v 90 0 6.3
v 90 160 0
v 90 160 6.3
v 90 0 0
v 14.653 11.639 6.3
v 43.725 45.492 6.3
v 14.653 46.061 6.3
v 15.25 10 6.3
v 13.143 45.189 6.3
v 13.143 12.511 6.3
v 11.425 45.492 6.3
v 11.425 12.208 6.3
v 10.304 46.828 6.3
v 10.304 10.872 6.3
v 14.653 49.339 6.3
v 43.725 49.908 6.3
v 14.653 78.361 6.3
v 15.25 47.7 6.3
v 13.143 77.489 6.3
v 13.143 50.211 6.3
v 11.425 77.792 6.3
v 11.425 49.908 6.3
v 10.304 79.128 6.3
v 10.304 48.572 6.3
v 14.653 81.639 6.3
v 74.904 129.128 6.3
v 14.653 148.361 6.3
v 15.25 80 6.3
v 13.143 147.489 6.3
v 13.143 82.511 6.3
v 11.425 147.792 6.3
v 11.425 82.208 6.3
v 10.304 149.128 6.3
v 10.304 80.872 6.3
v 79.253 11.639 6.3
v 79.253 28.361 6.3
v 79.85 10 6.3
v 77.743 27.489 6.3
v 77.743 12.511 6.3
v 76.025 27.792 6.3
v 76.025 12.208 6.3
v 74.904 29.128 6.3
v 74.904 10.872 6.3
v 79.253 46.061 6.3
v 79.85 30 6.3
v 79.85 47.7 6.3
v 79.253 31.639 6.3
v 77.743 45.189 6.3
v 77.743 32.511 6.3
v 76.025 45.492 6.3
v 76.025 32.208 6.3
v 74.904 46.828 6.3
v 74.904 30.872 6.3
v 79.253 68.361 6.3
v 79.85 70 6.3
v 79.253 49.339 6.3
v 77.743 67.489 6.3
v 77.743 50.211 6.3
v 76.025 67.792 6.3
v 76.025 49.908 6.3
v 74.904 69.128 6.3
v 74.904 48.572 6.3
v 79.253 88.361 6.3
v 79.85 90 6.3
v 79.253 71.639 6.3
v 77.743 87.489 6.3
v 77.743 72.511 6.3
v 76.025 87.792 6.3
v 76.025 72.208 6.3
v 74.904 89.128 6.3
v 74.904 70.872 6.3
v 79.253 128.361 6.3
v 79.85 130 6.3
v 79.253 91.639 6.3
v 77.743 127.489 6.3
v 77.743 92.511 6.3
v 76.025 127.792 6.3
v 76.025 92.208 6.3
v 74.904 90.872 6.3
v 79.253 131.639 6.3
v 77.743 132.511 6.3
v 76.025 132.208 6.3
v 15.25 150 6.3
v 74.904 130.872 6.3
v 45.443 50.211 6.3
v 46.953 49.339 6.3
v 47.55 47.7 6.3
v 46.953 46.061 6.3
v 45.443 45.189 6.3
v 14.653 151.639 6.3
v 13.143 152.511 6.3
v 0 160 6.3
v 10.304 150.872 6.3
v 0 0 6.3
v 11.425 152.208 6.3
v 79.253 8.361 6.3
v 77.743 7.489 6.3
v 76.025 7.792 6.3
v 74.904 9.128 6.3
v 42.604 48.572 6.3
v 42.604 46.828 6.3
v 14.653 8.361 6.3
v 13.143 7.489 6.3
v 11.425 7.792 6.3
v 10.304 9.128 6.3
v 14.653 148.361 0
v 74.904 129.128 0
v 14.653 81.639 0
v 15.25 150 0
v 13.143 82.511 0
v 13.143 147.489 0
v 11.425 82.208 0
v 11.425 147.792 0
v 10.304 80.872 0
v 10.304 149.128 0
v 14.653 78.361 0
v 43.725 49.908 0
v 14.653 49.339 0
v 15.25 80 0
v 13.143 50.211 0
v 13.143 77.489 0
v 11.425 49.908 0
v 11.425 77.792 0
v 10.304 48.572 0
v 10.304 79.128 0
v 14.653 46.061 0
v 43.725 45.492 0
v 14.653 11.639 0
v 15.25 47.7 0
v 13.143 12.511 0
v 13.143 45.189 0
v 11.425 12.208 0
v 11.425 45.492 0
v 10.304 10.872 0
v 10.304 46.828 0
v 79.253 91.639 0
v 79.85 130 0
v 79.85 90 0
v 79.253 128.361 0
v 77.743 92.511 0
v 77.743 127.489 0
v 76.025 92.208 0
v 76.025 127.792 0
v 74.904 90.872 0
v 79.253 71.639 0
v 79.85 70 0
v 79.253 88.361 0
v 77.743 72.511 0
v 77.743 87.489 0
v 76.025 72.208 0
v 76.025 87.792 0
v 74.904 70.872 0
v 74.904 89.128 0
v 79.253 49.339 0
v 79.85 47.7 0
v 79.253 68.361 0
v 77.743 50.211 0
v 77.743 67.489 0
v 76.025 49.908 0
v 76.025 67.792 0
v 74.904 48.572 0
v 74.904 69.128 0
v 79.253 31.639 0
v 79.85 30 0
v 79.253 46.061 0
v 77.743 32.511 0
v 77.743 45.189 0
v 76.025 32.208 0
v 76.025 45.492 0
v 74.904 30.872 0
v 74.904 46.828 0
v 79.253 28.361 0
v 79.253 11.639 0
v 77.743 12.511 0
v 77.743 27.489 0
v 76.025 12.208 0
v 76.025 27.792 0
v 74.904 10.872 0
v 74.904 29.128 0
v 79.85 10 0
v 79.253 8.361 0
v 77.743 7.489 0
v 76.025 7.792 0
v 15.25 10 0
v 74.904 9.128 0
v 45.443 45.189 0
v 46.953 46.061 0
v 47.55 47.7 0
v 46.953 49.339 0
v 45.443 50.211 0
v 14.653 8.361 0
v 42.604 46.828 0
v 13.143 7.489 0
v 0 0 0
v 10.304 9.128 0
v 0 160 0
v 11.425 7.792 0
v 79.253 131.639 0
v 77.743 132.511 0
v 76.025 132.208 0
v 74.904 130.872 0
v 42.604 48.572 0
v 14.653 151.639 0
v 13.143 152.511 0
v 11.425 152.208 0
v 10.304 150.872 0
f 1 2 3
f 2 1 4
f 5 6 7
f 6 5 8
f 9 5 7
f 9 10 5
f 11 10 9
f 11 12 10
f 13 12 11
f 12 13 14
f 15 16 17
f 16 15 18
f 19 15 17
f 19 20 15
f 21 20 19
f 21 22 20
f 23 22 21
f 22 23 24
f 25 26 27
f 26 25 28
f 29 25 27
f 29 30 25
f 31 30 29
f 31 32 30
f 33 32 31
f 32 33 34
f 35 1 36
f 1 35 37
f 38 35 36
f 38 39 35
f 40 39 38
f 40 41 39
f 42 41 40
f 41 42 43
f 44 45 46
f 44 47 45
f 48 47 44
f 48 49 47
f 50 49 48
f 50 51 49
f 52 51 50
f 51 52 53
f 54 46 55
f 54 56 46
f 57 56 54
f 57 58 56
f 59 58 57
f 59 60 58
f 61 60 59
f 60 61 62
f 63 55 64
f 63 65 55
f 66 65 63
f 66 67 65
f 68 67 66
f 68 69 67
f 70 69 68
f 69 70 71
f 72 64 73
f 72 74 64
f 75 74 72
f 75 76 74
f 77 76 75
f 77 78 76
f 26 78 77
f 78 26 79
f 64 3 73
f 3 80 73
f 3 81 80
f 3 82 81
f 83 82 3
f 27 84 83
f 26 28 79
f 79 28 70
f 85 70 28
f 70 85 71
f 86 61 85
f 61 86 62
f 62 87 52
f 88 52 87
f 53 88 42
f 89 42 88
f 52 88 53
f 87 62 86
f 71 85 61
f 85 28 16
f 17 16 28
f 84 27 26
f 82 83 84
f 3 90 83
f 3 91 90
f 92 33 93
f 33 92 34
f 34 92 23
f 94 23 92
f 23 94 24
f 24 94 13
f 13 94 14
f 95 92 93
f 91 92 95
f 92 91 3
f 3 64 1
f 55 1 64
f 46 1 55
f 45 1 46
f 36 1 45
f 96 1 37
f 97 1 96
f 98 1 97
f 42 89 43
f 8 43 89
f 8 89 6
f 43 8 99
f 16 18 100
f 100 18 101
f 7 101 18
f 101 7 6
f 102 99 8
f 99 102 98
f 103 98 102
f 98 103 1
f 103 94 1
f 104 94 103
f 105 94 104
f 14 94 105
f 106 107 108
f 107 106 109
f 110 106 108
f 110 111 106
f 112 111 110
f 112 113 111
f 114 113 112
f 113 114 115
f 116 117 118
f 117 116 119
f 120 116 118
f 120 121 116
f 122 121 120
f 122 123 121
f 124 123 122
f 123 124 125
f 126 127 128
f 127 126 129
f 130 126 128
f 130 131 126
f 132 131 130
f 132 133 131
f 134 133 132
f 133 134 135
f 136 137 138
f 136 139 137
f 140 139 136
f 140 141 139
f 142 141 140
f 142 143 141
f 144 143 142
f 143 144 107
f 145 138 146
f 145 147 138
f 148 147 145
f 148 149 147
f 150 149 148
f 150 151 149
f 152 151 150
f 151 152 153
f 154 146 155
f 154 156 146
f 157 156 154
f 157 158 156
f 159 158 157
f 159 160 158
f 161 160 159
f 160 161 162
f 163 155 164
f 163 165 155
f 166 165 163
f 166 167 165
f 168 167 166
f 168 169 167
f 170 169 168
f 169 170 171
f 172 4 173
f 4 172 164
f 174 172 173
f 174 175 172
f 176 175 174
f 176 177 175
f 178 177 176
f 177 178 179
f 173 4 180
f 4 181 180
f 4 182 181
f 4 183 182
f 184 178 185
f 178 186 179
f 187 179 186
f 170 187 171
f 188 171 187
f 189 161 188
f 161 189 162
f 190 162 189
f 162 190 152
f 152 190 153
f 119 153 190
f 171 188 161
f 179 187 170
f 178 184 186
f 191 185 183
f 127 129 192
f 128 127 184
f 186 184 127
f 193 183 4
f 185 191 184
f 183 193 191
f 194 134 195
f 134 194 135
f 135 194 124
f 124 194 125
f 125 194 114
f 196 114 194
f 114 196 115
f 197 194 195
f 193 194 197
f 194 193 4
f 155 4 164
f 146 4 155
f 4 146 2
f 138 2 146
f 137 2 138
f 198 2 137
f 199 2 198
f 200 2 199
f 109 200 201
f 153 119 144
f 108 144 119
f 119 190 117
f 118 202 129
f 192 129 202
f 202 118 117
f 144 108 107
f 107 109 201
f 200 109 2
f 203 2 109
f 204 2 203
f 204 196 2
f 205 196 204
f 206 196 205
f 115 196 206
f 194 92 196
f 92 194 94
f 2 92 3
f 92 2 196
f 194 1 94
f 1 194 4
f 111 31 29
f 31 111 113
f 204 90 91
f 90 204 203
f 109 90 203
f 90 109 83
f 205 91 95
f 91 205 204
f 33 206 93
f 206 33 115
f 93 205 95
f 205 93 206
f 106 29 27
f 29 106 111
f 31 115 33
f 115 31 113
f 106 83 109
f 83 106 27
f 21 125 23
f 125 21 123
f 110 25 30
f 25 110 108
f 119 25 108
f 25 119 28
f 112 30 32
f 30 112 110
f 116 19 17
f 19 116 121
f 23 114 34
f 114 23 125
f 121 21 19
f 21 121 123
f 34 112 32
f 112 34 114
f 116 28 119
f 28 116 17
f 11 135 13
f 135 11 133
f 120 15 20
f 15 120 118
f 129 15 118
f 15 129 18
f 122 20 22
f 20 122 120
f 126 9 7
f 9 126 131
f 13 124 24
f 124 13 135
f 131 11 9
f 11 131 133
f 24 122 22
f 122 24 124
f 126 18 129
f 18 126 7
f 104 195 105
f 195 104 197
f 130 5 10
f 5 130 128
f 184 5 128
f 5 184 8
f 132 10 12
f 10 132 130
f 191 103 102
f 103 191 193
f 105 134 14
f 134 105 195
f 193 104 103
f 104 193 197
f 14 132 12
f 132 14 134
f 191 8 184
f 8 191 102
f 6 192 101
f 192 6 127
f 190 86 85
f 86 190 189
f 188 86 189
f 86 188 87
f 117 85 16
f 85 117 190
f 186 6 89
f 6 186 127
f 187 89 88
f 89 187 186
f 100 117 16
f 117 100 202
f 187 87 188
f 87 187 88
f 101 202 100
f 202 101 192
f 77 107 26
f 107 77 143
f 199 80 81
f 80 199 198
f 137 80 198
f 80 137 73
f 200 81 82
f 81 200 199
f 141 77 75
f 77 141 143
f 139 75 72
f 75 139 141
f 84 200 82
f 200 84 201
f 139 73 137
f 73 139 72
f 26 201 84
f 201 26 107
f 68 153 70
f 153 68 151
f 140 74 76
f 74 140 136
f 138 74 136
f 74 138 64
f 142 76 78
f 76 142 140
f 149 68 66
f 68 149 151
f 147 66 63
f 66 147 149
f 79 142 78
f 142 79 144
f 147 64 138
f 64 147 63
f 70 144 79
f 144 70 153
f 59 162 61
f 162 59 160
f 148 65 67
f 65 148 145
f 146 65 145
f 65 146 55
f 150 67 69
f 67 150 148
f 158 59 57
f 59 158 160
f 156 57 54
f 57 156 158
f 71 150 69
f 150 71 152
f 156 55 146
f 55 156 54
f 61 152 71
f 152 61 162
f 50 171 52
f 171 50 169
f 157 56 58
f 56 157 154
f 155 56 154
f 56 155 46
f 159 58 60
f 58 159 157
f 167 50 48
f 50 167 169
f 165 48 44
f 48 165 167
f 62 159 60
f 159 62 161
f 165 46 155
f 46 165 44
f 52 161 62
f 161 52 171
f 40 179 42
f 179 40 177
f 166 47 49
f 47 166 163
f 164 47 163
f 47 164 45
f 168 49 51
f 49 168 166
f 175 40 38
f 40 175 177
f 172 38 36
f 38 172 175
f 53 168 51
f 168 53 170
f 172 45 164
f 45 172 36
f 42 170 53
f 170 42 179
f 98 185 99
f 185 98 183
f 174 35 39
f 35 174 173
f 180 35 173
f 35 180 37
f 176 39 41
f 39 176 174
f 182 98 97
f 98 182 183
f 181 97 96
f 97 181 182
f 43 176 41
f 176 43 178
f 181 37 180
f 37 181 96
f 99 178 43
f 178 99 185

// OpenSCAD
length = 160;
width = 90;
thickness = 6.3;

small_radius=2.55;


difference(){
	
	cube(size = [width,length,thickness], center =false);
	

	//wheel	
		translate(v=[12.7,150,0])
		cylinder(h=thickness, r=small_radius, center=false);
	//wheel, part of sub plate
		translate(v=[12.7,80,0])
		cylinder(h=thickness, r=small_radius, center=false);
	//wheel, part of sub plate
		translate(v=[12.7,47.7,0])
		cylinder(h=thickness, r=small_radius, center=false);
	//wheel
		translate(v=[12.7,10,0])
		cylinder(h=thickness, r=small_radius, center=false);

		translate(v=[45,47.7,0])
		cylinder(h=thickness, r=small_radius, center=false);
	//wheel
		translate(v=[77.3,130,0])
		cylinder(h=thickness, r=small_radius, center=false);
	
		translate(v=[77.3,90,0])
		cylinder(h=thickness, r=small_radius, center=false);

		translate(v=[77.3,70,0])
		cylinder(h=thickness, r=small_radius, center=false);

		translate(v=[77.3,47.7,0])
		cylinder(h=thickness, r=small_radius, center=false);

	//wheel
		translate(v=[77.3,30,0])
		cylinder(h=thickness, r=small_radius, center=false);

		translate(v=[77.3,10,0])
		cylinder(h=thickness, r=small_radius, center=false);
}
